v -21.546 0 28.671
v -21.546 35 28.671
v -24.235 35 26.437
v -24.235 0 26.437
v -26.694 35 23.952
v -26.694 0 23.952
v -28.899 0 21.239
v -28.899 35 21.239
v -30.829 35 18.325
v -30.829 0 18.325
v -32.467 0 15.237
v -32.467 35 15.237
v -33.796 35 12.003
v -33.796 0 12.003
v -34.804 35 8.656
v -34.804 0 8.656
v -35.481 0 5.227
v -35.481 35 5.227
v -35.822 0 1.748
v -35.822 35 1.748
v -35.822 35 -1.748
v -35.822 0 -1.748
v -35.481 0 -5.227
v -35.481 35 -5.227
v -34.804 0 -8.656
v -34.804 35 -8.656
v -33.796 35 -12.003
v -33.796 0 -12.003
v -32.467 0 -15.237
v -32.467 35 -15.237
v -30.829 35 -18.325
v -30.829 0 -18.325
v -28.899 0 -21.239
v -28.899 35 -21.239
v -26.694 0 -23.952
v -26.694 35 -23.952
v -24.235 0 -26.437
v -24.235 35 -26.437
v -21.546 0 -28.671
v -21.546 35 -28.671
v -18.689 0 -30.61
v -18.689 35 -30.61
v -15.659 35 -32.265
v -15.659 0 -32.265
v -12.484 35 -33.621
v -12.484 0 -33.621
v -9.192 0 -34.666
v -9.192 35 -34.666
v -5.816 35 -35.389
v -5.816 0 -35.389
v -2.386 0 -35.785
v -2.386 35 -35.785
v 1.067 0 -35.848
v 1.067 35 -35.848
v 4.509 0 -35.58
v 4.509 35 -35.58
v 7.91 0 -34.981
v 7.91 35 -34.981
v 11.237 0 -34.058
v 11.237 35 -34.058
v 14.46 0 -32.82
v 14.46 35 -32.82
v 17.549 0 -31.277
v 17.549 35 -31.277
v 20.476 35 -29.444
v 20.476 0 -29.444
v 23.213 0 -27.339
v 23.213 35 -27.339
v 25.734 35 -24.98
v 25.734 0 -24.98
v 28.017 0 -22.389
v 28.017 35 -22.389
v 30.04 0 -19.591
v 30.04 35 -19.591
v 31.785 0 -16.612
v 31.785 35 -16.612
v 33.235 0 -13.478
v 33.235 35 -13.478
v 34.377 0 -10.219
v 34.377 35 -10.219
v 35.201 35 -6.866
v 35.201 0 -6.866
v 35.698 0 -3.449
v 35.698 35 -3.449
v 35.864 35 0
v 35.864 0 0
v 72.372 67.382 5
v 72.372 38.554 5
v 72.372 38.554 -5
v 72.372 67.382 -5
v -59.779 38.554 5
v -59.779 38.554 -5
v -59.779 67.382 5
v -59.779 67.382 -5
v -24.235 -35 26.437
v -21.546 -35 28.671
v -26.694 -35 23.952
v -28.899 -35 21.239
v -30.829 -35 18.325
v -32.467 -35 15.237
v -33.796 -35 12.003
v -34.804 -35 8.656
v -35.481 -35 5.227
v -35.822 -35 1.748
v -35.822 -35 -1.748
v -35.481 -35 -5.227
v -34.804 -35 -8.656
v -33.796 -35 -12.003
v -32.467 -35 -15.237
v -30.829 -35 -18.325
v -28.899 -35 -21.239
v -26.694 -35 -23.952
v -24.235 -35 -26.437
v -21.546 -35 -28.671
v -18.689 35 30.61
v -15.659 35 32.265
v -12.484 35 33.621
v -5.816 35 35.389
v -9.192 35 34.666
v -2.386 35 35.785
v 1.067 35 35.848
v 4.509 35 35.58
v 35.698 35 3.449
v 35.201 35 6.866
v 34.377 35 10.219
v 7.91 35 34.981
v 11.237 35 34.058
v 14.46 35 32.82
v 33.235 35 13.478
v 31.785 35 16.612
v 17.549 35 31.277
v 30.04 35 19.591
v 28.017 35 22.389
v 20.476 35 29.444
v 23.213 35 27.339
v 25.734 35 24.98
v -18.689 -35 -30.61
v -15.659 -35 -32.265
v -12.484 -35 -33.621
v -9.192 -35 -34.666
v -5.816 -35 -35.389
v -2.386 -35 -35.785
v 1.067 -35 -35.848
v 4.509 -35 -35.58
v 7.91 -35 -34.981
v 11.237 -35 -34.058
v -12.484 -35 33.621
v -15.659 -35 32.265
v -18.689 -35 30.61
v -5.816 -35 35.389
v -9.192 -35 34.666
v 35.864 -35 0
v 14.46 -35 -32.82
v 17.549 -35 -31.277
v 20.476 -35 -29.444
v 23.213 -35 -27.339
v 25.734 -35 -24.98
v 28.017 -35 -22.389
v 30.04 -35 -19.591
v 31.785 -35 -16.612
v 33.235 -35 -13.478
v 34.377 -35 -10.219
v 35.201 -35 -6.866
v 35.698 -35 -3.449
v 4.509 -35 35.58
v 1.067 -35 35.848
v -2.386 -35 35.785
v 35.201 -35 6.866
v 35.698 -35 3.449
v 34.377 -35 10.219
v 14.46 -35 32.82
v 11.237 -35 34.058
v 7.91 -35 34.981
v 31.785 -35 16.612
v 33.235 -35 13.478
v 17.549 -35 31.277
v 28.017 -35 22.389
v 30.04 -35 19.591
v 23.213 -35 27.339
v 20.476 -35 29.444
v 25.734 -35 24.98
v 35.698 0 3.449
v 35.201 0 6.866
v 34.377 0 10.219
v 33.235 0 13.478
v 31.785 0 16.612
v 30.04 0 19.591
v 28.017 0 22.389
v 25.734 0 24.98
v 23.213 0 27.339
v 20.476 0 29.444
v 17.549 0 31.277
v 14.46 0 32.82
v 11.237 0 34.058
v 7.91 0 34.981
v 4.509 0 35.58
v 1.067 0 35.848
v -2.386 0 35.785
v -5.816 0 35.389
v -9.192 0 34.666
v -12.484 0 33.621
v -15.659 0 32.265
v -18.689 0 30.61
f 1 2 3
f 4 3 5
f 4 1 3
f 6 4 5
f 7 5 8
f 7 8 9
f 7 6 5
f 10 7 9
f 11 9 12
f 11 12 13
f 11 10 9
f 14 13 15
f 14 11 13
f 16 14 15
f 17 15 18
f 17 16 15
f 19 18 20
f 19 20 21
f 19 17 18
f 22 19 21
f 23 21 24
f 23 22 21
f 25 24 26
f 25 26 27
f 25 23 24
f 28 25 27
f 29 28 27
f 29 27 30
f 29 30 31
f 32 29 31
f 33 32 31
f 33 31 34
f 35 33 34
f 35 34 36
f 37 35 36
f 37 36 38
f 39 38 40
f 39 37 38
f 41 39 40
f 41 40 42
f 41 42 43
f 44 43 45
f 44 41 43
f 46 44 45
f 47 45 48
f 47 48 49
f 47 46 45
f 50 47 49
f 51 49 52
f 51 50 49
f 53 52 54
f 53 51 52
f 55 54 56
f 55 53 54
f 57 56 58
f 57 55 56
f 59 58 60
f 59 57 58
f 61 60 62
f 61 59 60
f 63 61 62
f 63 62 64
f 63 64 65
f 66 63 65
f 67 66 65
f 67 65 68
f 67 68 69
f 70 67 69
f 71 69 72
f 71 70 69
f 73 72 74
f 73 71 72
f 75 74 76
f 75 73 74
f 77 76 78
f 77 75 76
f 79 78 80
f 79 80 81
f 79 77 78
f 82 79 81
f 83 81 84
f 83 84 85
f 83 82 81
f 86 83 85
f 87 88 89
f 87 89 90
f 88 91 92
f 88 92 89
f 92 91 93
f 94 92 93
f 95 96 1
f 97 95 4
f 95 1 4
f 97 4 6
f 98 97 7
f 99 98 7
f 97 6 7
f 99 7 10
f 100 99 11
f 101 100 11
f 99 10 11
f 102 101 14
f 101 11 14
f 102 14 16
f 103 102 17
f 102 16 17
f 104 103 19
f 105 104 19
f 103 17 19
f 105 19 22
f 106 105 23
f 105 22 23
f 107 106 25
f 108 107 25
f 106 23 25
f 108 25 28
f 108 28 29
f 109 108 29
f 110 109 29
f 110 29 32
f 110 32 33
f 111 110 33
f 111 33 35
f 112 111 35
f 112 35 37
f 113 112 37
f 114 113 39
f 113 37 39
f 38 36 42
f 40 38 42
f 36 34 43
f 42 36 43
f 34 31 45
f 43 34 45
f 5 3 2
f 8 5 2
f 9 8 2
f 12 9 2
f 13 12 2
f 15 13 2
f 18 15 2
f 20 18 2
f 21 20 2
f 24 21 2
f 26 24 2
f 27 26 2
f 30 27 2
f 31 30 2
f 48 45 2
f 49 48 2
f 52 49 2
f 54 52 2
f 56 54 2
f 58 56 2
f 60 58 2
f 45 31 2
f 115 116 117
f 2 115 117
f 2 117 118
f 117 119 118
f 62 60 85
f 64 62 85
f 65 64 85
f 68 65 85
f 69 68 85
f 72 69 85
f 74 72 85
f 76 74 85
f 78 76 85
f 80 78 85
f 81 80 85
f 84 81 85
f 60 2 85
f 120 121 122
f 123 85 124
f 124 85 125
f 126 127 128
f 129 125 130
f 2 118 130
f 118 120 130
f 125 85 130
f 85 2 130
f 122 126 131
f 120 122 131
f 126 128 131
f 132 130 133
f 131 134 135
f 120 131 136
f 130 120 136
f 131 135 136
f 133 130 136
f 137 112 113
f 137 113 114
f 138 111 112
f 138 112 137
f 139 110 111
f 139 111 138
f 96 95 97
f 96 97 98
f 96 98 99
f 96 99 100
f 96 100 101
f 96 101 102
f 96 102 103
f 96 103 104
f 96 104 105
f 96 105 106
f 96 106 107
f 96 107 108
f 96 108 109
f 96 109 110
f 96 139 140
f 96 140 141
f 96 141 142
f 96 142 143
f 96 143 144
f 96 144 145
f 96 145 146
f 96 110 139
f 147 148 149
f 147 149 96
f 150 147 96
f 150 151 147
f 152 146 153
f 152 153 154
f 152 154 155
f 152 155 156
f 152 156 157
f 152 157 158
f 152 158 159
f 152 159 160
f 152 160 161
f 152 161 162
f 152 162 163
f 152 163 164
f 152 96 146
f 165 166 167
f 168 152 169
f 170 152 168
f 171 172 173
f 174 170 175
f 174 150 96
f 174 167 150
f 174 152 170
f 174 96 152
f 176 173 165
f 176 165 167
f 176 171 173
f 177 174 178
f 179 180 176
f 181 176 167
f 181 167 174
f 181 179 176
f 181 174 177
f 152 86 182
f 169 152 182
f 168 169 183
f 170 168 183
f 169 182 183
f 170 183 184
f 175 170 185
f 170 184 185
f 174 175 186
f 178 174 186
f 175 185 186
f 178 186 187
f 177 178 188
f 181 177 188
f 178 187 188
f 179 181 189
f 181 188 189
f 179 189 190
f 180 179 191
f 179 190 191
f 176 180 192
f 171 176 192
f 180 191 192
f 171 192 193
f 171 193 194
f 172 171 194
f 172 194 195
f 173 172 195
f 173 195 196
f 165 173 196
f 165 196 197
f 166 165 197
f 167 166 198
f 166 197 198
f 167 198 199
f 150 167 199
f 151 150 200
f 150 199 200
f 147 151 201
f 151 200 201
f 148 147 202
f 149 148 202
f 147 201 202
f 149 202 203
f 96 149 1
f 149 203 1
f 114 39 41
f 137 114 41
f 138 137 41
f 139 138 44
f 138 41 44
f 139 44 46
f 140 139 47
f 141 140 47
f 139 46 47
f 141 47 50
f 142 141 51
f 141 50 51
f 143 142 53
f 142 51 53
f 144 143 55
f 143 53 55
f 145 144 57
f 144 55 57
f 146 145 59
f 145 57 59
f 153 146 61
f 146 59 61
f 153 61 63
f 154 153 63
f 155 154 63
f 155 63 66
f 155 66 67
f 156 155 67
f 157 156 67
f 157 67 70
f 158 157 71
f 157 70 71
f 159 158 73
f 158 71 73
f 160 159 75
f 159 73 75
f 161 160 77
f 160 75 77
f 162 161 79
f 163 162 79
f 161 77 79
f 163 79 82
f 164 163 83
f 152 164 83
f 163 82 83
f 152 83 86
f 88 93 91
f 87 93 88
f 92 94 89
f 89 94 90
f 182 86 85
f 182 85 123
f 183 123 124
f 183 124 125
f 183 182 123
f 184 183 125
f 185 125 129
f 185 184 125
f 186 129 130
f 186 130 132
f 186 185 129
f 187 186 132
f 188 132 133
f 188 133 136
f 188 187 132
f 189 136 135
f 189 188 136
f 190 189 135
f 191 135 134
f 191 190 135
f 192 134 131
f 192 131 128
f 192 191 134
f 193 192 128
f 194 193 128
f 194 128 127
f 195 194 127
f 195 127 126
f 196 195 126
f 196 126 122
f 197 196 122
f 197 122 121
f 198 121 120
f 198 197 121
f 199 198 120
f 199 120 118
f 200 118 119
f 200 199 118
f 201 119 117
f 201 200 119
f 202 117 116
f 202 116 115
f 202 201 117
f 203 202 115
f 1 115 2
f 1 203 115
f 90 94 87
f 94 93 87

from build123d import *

# Parameters (mm, degrees)
F1_DEPTH = 35
F2_W     = 132.1505941451
F2_H     = 28.8282912225
F3_DEPTH = 5


with BuildPart() as f1:
    # F0 (on Front) → F1 (new body, symmetric)
    with BuildSketch(Plane.XZ):
        with BuildLine():
            ThreePointArc((21.5461921372, 28.6705084145), (0, 35.8641387511), (-21.5461921372, 28.6705084145))
            Line((-21.5461921372, 28.6705084145), (21.5461921372, 28.6705084145))
        make_face()
        with BuildLine():
            Line((21.5461921372, 28.6705084145), (-21.5461921372, 28.6705084145))
            ThreePointArc((-21.5461921372, 28.6705084145), (-35.8641387511, 0), (-21.5461921372, -28.6705084145))
            Line((-21.5461921372, -28.6705084145), (21.5461921372, -28.6705084145))
            ThreePointArc((21.5461921372, -28.6705084145), (32.0856048153, -16.023433215), (35.8641387511, 0))
            ThreePointArc((35.8641387511, 0), (32.0856048153, 16.023433215), (21.5461921372, 28.6705084145))
        make_face()
        with BuildLine():
            Line((21.5461921372, -28.6705084145), (-21.5461921372, -28.6705084145))
            ThreePointArc((-21.5461921372, -28.6705084145), (0, -35.8641387511), (21.5461921372, -28.6705084145))
        make_face()
    extrude(amount=F1_DEPTH, both=True)


with BuildPart() as f3:
    # F2 (on Top) → F3 (new body, symmetric)
    with BuildSketch(Plane.XY):
        with Locations((6.296729669, 52.9679069296)):
            Rectangle(F2_W, F2_H)
    extrude(amount=F3_DEPTH, both=True)


solid = Compound([f1.part, f3.part])
